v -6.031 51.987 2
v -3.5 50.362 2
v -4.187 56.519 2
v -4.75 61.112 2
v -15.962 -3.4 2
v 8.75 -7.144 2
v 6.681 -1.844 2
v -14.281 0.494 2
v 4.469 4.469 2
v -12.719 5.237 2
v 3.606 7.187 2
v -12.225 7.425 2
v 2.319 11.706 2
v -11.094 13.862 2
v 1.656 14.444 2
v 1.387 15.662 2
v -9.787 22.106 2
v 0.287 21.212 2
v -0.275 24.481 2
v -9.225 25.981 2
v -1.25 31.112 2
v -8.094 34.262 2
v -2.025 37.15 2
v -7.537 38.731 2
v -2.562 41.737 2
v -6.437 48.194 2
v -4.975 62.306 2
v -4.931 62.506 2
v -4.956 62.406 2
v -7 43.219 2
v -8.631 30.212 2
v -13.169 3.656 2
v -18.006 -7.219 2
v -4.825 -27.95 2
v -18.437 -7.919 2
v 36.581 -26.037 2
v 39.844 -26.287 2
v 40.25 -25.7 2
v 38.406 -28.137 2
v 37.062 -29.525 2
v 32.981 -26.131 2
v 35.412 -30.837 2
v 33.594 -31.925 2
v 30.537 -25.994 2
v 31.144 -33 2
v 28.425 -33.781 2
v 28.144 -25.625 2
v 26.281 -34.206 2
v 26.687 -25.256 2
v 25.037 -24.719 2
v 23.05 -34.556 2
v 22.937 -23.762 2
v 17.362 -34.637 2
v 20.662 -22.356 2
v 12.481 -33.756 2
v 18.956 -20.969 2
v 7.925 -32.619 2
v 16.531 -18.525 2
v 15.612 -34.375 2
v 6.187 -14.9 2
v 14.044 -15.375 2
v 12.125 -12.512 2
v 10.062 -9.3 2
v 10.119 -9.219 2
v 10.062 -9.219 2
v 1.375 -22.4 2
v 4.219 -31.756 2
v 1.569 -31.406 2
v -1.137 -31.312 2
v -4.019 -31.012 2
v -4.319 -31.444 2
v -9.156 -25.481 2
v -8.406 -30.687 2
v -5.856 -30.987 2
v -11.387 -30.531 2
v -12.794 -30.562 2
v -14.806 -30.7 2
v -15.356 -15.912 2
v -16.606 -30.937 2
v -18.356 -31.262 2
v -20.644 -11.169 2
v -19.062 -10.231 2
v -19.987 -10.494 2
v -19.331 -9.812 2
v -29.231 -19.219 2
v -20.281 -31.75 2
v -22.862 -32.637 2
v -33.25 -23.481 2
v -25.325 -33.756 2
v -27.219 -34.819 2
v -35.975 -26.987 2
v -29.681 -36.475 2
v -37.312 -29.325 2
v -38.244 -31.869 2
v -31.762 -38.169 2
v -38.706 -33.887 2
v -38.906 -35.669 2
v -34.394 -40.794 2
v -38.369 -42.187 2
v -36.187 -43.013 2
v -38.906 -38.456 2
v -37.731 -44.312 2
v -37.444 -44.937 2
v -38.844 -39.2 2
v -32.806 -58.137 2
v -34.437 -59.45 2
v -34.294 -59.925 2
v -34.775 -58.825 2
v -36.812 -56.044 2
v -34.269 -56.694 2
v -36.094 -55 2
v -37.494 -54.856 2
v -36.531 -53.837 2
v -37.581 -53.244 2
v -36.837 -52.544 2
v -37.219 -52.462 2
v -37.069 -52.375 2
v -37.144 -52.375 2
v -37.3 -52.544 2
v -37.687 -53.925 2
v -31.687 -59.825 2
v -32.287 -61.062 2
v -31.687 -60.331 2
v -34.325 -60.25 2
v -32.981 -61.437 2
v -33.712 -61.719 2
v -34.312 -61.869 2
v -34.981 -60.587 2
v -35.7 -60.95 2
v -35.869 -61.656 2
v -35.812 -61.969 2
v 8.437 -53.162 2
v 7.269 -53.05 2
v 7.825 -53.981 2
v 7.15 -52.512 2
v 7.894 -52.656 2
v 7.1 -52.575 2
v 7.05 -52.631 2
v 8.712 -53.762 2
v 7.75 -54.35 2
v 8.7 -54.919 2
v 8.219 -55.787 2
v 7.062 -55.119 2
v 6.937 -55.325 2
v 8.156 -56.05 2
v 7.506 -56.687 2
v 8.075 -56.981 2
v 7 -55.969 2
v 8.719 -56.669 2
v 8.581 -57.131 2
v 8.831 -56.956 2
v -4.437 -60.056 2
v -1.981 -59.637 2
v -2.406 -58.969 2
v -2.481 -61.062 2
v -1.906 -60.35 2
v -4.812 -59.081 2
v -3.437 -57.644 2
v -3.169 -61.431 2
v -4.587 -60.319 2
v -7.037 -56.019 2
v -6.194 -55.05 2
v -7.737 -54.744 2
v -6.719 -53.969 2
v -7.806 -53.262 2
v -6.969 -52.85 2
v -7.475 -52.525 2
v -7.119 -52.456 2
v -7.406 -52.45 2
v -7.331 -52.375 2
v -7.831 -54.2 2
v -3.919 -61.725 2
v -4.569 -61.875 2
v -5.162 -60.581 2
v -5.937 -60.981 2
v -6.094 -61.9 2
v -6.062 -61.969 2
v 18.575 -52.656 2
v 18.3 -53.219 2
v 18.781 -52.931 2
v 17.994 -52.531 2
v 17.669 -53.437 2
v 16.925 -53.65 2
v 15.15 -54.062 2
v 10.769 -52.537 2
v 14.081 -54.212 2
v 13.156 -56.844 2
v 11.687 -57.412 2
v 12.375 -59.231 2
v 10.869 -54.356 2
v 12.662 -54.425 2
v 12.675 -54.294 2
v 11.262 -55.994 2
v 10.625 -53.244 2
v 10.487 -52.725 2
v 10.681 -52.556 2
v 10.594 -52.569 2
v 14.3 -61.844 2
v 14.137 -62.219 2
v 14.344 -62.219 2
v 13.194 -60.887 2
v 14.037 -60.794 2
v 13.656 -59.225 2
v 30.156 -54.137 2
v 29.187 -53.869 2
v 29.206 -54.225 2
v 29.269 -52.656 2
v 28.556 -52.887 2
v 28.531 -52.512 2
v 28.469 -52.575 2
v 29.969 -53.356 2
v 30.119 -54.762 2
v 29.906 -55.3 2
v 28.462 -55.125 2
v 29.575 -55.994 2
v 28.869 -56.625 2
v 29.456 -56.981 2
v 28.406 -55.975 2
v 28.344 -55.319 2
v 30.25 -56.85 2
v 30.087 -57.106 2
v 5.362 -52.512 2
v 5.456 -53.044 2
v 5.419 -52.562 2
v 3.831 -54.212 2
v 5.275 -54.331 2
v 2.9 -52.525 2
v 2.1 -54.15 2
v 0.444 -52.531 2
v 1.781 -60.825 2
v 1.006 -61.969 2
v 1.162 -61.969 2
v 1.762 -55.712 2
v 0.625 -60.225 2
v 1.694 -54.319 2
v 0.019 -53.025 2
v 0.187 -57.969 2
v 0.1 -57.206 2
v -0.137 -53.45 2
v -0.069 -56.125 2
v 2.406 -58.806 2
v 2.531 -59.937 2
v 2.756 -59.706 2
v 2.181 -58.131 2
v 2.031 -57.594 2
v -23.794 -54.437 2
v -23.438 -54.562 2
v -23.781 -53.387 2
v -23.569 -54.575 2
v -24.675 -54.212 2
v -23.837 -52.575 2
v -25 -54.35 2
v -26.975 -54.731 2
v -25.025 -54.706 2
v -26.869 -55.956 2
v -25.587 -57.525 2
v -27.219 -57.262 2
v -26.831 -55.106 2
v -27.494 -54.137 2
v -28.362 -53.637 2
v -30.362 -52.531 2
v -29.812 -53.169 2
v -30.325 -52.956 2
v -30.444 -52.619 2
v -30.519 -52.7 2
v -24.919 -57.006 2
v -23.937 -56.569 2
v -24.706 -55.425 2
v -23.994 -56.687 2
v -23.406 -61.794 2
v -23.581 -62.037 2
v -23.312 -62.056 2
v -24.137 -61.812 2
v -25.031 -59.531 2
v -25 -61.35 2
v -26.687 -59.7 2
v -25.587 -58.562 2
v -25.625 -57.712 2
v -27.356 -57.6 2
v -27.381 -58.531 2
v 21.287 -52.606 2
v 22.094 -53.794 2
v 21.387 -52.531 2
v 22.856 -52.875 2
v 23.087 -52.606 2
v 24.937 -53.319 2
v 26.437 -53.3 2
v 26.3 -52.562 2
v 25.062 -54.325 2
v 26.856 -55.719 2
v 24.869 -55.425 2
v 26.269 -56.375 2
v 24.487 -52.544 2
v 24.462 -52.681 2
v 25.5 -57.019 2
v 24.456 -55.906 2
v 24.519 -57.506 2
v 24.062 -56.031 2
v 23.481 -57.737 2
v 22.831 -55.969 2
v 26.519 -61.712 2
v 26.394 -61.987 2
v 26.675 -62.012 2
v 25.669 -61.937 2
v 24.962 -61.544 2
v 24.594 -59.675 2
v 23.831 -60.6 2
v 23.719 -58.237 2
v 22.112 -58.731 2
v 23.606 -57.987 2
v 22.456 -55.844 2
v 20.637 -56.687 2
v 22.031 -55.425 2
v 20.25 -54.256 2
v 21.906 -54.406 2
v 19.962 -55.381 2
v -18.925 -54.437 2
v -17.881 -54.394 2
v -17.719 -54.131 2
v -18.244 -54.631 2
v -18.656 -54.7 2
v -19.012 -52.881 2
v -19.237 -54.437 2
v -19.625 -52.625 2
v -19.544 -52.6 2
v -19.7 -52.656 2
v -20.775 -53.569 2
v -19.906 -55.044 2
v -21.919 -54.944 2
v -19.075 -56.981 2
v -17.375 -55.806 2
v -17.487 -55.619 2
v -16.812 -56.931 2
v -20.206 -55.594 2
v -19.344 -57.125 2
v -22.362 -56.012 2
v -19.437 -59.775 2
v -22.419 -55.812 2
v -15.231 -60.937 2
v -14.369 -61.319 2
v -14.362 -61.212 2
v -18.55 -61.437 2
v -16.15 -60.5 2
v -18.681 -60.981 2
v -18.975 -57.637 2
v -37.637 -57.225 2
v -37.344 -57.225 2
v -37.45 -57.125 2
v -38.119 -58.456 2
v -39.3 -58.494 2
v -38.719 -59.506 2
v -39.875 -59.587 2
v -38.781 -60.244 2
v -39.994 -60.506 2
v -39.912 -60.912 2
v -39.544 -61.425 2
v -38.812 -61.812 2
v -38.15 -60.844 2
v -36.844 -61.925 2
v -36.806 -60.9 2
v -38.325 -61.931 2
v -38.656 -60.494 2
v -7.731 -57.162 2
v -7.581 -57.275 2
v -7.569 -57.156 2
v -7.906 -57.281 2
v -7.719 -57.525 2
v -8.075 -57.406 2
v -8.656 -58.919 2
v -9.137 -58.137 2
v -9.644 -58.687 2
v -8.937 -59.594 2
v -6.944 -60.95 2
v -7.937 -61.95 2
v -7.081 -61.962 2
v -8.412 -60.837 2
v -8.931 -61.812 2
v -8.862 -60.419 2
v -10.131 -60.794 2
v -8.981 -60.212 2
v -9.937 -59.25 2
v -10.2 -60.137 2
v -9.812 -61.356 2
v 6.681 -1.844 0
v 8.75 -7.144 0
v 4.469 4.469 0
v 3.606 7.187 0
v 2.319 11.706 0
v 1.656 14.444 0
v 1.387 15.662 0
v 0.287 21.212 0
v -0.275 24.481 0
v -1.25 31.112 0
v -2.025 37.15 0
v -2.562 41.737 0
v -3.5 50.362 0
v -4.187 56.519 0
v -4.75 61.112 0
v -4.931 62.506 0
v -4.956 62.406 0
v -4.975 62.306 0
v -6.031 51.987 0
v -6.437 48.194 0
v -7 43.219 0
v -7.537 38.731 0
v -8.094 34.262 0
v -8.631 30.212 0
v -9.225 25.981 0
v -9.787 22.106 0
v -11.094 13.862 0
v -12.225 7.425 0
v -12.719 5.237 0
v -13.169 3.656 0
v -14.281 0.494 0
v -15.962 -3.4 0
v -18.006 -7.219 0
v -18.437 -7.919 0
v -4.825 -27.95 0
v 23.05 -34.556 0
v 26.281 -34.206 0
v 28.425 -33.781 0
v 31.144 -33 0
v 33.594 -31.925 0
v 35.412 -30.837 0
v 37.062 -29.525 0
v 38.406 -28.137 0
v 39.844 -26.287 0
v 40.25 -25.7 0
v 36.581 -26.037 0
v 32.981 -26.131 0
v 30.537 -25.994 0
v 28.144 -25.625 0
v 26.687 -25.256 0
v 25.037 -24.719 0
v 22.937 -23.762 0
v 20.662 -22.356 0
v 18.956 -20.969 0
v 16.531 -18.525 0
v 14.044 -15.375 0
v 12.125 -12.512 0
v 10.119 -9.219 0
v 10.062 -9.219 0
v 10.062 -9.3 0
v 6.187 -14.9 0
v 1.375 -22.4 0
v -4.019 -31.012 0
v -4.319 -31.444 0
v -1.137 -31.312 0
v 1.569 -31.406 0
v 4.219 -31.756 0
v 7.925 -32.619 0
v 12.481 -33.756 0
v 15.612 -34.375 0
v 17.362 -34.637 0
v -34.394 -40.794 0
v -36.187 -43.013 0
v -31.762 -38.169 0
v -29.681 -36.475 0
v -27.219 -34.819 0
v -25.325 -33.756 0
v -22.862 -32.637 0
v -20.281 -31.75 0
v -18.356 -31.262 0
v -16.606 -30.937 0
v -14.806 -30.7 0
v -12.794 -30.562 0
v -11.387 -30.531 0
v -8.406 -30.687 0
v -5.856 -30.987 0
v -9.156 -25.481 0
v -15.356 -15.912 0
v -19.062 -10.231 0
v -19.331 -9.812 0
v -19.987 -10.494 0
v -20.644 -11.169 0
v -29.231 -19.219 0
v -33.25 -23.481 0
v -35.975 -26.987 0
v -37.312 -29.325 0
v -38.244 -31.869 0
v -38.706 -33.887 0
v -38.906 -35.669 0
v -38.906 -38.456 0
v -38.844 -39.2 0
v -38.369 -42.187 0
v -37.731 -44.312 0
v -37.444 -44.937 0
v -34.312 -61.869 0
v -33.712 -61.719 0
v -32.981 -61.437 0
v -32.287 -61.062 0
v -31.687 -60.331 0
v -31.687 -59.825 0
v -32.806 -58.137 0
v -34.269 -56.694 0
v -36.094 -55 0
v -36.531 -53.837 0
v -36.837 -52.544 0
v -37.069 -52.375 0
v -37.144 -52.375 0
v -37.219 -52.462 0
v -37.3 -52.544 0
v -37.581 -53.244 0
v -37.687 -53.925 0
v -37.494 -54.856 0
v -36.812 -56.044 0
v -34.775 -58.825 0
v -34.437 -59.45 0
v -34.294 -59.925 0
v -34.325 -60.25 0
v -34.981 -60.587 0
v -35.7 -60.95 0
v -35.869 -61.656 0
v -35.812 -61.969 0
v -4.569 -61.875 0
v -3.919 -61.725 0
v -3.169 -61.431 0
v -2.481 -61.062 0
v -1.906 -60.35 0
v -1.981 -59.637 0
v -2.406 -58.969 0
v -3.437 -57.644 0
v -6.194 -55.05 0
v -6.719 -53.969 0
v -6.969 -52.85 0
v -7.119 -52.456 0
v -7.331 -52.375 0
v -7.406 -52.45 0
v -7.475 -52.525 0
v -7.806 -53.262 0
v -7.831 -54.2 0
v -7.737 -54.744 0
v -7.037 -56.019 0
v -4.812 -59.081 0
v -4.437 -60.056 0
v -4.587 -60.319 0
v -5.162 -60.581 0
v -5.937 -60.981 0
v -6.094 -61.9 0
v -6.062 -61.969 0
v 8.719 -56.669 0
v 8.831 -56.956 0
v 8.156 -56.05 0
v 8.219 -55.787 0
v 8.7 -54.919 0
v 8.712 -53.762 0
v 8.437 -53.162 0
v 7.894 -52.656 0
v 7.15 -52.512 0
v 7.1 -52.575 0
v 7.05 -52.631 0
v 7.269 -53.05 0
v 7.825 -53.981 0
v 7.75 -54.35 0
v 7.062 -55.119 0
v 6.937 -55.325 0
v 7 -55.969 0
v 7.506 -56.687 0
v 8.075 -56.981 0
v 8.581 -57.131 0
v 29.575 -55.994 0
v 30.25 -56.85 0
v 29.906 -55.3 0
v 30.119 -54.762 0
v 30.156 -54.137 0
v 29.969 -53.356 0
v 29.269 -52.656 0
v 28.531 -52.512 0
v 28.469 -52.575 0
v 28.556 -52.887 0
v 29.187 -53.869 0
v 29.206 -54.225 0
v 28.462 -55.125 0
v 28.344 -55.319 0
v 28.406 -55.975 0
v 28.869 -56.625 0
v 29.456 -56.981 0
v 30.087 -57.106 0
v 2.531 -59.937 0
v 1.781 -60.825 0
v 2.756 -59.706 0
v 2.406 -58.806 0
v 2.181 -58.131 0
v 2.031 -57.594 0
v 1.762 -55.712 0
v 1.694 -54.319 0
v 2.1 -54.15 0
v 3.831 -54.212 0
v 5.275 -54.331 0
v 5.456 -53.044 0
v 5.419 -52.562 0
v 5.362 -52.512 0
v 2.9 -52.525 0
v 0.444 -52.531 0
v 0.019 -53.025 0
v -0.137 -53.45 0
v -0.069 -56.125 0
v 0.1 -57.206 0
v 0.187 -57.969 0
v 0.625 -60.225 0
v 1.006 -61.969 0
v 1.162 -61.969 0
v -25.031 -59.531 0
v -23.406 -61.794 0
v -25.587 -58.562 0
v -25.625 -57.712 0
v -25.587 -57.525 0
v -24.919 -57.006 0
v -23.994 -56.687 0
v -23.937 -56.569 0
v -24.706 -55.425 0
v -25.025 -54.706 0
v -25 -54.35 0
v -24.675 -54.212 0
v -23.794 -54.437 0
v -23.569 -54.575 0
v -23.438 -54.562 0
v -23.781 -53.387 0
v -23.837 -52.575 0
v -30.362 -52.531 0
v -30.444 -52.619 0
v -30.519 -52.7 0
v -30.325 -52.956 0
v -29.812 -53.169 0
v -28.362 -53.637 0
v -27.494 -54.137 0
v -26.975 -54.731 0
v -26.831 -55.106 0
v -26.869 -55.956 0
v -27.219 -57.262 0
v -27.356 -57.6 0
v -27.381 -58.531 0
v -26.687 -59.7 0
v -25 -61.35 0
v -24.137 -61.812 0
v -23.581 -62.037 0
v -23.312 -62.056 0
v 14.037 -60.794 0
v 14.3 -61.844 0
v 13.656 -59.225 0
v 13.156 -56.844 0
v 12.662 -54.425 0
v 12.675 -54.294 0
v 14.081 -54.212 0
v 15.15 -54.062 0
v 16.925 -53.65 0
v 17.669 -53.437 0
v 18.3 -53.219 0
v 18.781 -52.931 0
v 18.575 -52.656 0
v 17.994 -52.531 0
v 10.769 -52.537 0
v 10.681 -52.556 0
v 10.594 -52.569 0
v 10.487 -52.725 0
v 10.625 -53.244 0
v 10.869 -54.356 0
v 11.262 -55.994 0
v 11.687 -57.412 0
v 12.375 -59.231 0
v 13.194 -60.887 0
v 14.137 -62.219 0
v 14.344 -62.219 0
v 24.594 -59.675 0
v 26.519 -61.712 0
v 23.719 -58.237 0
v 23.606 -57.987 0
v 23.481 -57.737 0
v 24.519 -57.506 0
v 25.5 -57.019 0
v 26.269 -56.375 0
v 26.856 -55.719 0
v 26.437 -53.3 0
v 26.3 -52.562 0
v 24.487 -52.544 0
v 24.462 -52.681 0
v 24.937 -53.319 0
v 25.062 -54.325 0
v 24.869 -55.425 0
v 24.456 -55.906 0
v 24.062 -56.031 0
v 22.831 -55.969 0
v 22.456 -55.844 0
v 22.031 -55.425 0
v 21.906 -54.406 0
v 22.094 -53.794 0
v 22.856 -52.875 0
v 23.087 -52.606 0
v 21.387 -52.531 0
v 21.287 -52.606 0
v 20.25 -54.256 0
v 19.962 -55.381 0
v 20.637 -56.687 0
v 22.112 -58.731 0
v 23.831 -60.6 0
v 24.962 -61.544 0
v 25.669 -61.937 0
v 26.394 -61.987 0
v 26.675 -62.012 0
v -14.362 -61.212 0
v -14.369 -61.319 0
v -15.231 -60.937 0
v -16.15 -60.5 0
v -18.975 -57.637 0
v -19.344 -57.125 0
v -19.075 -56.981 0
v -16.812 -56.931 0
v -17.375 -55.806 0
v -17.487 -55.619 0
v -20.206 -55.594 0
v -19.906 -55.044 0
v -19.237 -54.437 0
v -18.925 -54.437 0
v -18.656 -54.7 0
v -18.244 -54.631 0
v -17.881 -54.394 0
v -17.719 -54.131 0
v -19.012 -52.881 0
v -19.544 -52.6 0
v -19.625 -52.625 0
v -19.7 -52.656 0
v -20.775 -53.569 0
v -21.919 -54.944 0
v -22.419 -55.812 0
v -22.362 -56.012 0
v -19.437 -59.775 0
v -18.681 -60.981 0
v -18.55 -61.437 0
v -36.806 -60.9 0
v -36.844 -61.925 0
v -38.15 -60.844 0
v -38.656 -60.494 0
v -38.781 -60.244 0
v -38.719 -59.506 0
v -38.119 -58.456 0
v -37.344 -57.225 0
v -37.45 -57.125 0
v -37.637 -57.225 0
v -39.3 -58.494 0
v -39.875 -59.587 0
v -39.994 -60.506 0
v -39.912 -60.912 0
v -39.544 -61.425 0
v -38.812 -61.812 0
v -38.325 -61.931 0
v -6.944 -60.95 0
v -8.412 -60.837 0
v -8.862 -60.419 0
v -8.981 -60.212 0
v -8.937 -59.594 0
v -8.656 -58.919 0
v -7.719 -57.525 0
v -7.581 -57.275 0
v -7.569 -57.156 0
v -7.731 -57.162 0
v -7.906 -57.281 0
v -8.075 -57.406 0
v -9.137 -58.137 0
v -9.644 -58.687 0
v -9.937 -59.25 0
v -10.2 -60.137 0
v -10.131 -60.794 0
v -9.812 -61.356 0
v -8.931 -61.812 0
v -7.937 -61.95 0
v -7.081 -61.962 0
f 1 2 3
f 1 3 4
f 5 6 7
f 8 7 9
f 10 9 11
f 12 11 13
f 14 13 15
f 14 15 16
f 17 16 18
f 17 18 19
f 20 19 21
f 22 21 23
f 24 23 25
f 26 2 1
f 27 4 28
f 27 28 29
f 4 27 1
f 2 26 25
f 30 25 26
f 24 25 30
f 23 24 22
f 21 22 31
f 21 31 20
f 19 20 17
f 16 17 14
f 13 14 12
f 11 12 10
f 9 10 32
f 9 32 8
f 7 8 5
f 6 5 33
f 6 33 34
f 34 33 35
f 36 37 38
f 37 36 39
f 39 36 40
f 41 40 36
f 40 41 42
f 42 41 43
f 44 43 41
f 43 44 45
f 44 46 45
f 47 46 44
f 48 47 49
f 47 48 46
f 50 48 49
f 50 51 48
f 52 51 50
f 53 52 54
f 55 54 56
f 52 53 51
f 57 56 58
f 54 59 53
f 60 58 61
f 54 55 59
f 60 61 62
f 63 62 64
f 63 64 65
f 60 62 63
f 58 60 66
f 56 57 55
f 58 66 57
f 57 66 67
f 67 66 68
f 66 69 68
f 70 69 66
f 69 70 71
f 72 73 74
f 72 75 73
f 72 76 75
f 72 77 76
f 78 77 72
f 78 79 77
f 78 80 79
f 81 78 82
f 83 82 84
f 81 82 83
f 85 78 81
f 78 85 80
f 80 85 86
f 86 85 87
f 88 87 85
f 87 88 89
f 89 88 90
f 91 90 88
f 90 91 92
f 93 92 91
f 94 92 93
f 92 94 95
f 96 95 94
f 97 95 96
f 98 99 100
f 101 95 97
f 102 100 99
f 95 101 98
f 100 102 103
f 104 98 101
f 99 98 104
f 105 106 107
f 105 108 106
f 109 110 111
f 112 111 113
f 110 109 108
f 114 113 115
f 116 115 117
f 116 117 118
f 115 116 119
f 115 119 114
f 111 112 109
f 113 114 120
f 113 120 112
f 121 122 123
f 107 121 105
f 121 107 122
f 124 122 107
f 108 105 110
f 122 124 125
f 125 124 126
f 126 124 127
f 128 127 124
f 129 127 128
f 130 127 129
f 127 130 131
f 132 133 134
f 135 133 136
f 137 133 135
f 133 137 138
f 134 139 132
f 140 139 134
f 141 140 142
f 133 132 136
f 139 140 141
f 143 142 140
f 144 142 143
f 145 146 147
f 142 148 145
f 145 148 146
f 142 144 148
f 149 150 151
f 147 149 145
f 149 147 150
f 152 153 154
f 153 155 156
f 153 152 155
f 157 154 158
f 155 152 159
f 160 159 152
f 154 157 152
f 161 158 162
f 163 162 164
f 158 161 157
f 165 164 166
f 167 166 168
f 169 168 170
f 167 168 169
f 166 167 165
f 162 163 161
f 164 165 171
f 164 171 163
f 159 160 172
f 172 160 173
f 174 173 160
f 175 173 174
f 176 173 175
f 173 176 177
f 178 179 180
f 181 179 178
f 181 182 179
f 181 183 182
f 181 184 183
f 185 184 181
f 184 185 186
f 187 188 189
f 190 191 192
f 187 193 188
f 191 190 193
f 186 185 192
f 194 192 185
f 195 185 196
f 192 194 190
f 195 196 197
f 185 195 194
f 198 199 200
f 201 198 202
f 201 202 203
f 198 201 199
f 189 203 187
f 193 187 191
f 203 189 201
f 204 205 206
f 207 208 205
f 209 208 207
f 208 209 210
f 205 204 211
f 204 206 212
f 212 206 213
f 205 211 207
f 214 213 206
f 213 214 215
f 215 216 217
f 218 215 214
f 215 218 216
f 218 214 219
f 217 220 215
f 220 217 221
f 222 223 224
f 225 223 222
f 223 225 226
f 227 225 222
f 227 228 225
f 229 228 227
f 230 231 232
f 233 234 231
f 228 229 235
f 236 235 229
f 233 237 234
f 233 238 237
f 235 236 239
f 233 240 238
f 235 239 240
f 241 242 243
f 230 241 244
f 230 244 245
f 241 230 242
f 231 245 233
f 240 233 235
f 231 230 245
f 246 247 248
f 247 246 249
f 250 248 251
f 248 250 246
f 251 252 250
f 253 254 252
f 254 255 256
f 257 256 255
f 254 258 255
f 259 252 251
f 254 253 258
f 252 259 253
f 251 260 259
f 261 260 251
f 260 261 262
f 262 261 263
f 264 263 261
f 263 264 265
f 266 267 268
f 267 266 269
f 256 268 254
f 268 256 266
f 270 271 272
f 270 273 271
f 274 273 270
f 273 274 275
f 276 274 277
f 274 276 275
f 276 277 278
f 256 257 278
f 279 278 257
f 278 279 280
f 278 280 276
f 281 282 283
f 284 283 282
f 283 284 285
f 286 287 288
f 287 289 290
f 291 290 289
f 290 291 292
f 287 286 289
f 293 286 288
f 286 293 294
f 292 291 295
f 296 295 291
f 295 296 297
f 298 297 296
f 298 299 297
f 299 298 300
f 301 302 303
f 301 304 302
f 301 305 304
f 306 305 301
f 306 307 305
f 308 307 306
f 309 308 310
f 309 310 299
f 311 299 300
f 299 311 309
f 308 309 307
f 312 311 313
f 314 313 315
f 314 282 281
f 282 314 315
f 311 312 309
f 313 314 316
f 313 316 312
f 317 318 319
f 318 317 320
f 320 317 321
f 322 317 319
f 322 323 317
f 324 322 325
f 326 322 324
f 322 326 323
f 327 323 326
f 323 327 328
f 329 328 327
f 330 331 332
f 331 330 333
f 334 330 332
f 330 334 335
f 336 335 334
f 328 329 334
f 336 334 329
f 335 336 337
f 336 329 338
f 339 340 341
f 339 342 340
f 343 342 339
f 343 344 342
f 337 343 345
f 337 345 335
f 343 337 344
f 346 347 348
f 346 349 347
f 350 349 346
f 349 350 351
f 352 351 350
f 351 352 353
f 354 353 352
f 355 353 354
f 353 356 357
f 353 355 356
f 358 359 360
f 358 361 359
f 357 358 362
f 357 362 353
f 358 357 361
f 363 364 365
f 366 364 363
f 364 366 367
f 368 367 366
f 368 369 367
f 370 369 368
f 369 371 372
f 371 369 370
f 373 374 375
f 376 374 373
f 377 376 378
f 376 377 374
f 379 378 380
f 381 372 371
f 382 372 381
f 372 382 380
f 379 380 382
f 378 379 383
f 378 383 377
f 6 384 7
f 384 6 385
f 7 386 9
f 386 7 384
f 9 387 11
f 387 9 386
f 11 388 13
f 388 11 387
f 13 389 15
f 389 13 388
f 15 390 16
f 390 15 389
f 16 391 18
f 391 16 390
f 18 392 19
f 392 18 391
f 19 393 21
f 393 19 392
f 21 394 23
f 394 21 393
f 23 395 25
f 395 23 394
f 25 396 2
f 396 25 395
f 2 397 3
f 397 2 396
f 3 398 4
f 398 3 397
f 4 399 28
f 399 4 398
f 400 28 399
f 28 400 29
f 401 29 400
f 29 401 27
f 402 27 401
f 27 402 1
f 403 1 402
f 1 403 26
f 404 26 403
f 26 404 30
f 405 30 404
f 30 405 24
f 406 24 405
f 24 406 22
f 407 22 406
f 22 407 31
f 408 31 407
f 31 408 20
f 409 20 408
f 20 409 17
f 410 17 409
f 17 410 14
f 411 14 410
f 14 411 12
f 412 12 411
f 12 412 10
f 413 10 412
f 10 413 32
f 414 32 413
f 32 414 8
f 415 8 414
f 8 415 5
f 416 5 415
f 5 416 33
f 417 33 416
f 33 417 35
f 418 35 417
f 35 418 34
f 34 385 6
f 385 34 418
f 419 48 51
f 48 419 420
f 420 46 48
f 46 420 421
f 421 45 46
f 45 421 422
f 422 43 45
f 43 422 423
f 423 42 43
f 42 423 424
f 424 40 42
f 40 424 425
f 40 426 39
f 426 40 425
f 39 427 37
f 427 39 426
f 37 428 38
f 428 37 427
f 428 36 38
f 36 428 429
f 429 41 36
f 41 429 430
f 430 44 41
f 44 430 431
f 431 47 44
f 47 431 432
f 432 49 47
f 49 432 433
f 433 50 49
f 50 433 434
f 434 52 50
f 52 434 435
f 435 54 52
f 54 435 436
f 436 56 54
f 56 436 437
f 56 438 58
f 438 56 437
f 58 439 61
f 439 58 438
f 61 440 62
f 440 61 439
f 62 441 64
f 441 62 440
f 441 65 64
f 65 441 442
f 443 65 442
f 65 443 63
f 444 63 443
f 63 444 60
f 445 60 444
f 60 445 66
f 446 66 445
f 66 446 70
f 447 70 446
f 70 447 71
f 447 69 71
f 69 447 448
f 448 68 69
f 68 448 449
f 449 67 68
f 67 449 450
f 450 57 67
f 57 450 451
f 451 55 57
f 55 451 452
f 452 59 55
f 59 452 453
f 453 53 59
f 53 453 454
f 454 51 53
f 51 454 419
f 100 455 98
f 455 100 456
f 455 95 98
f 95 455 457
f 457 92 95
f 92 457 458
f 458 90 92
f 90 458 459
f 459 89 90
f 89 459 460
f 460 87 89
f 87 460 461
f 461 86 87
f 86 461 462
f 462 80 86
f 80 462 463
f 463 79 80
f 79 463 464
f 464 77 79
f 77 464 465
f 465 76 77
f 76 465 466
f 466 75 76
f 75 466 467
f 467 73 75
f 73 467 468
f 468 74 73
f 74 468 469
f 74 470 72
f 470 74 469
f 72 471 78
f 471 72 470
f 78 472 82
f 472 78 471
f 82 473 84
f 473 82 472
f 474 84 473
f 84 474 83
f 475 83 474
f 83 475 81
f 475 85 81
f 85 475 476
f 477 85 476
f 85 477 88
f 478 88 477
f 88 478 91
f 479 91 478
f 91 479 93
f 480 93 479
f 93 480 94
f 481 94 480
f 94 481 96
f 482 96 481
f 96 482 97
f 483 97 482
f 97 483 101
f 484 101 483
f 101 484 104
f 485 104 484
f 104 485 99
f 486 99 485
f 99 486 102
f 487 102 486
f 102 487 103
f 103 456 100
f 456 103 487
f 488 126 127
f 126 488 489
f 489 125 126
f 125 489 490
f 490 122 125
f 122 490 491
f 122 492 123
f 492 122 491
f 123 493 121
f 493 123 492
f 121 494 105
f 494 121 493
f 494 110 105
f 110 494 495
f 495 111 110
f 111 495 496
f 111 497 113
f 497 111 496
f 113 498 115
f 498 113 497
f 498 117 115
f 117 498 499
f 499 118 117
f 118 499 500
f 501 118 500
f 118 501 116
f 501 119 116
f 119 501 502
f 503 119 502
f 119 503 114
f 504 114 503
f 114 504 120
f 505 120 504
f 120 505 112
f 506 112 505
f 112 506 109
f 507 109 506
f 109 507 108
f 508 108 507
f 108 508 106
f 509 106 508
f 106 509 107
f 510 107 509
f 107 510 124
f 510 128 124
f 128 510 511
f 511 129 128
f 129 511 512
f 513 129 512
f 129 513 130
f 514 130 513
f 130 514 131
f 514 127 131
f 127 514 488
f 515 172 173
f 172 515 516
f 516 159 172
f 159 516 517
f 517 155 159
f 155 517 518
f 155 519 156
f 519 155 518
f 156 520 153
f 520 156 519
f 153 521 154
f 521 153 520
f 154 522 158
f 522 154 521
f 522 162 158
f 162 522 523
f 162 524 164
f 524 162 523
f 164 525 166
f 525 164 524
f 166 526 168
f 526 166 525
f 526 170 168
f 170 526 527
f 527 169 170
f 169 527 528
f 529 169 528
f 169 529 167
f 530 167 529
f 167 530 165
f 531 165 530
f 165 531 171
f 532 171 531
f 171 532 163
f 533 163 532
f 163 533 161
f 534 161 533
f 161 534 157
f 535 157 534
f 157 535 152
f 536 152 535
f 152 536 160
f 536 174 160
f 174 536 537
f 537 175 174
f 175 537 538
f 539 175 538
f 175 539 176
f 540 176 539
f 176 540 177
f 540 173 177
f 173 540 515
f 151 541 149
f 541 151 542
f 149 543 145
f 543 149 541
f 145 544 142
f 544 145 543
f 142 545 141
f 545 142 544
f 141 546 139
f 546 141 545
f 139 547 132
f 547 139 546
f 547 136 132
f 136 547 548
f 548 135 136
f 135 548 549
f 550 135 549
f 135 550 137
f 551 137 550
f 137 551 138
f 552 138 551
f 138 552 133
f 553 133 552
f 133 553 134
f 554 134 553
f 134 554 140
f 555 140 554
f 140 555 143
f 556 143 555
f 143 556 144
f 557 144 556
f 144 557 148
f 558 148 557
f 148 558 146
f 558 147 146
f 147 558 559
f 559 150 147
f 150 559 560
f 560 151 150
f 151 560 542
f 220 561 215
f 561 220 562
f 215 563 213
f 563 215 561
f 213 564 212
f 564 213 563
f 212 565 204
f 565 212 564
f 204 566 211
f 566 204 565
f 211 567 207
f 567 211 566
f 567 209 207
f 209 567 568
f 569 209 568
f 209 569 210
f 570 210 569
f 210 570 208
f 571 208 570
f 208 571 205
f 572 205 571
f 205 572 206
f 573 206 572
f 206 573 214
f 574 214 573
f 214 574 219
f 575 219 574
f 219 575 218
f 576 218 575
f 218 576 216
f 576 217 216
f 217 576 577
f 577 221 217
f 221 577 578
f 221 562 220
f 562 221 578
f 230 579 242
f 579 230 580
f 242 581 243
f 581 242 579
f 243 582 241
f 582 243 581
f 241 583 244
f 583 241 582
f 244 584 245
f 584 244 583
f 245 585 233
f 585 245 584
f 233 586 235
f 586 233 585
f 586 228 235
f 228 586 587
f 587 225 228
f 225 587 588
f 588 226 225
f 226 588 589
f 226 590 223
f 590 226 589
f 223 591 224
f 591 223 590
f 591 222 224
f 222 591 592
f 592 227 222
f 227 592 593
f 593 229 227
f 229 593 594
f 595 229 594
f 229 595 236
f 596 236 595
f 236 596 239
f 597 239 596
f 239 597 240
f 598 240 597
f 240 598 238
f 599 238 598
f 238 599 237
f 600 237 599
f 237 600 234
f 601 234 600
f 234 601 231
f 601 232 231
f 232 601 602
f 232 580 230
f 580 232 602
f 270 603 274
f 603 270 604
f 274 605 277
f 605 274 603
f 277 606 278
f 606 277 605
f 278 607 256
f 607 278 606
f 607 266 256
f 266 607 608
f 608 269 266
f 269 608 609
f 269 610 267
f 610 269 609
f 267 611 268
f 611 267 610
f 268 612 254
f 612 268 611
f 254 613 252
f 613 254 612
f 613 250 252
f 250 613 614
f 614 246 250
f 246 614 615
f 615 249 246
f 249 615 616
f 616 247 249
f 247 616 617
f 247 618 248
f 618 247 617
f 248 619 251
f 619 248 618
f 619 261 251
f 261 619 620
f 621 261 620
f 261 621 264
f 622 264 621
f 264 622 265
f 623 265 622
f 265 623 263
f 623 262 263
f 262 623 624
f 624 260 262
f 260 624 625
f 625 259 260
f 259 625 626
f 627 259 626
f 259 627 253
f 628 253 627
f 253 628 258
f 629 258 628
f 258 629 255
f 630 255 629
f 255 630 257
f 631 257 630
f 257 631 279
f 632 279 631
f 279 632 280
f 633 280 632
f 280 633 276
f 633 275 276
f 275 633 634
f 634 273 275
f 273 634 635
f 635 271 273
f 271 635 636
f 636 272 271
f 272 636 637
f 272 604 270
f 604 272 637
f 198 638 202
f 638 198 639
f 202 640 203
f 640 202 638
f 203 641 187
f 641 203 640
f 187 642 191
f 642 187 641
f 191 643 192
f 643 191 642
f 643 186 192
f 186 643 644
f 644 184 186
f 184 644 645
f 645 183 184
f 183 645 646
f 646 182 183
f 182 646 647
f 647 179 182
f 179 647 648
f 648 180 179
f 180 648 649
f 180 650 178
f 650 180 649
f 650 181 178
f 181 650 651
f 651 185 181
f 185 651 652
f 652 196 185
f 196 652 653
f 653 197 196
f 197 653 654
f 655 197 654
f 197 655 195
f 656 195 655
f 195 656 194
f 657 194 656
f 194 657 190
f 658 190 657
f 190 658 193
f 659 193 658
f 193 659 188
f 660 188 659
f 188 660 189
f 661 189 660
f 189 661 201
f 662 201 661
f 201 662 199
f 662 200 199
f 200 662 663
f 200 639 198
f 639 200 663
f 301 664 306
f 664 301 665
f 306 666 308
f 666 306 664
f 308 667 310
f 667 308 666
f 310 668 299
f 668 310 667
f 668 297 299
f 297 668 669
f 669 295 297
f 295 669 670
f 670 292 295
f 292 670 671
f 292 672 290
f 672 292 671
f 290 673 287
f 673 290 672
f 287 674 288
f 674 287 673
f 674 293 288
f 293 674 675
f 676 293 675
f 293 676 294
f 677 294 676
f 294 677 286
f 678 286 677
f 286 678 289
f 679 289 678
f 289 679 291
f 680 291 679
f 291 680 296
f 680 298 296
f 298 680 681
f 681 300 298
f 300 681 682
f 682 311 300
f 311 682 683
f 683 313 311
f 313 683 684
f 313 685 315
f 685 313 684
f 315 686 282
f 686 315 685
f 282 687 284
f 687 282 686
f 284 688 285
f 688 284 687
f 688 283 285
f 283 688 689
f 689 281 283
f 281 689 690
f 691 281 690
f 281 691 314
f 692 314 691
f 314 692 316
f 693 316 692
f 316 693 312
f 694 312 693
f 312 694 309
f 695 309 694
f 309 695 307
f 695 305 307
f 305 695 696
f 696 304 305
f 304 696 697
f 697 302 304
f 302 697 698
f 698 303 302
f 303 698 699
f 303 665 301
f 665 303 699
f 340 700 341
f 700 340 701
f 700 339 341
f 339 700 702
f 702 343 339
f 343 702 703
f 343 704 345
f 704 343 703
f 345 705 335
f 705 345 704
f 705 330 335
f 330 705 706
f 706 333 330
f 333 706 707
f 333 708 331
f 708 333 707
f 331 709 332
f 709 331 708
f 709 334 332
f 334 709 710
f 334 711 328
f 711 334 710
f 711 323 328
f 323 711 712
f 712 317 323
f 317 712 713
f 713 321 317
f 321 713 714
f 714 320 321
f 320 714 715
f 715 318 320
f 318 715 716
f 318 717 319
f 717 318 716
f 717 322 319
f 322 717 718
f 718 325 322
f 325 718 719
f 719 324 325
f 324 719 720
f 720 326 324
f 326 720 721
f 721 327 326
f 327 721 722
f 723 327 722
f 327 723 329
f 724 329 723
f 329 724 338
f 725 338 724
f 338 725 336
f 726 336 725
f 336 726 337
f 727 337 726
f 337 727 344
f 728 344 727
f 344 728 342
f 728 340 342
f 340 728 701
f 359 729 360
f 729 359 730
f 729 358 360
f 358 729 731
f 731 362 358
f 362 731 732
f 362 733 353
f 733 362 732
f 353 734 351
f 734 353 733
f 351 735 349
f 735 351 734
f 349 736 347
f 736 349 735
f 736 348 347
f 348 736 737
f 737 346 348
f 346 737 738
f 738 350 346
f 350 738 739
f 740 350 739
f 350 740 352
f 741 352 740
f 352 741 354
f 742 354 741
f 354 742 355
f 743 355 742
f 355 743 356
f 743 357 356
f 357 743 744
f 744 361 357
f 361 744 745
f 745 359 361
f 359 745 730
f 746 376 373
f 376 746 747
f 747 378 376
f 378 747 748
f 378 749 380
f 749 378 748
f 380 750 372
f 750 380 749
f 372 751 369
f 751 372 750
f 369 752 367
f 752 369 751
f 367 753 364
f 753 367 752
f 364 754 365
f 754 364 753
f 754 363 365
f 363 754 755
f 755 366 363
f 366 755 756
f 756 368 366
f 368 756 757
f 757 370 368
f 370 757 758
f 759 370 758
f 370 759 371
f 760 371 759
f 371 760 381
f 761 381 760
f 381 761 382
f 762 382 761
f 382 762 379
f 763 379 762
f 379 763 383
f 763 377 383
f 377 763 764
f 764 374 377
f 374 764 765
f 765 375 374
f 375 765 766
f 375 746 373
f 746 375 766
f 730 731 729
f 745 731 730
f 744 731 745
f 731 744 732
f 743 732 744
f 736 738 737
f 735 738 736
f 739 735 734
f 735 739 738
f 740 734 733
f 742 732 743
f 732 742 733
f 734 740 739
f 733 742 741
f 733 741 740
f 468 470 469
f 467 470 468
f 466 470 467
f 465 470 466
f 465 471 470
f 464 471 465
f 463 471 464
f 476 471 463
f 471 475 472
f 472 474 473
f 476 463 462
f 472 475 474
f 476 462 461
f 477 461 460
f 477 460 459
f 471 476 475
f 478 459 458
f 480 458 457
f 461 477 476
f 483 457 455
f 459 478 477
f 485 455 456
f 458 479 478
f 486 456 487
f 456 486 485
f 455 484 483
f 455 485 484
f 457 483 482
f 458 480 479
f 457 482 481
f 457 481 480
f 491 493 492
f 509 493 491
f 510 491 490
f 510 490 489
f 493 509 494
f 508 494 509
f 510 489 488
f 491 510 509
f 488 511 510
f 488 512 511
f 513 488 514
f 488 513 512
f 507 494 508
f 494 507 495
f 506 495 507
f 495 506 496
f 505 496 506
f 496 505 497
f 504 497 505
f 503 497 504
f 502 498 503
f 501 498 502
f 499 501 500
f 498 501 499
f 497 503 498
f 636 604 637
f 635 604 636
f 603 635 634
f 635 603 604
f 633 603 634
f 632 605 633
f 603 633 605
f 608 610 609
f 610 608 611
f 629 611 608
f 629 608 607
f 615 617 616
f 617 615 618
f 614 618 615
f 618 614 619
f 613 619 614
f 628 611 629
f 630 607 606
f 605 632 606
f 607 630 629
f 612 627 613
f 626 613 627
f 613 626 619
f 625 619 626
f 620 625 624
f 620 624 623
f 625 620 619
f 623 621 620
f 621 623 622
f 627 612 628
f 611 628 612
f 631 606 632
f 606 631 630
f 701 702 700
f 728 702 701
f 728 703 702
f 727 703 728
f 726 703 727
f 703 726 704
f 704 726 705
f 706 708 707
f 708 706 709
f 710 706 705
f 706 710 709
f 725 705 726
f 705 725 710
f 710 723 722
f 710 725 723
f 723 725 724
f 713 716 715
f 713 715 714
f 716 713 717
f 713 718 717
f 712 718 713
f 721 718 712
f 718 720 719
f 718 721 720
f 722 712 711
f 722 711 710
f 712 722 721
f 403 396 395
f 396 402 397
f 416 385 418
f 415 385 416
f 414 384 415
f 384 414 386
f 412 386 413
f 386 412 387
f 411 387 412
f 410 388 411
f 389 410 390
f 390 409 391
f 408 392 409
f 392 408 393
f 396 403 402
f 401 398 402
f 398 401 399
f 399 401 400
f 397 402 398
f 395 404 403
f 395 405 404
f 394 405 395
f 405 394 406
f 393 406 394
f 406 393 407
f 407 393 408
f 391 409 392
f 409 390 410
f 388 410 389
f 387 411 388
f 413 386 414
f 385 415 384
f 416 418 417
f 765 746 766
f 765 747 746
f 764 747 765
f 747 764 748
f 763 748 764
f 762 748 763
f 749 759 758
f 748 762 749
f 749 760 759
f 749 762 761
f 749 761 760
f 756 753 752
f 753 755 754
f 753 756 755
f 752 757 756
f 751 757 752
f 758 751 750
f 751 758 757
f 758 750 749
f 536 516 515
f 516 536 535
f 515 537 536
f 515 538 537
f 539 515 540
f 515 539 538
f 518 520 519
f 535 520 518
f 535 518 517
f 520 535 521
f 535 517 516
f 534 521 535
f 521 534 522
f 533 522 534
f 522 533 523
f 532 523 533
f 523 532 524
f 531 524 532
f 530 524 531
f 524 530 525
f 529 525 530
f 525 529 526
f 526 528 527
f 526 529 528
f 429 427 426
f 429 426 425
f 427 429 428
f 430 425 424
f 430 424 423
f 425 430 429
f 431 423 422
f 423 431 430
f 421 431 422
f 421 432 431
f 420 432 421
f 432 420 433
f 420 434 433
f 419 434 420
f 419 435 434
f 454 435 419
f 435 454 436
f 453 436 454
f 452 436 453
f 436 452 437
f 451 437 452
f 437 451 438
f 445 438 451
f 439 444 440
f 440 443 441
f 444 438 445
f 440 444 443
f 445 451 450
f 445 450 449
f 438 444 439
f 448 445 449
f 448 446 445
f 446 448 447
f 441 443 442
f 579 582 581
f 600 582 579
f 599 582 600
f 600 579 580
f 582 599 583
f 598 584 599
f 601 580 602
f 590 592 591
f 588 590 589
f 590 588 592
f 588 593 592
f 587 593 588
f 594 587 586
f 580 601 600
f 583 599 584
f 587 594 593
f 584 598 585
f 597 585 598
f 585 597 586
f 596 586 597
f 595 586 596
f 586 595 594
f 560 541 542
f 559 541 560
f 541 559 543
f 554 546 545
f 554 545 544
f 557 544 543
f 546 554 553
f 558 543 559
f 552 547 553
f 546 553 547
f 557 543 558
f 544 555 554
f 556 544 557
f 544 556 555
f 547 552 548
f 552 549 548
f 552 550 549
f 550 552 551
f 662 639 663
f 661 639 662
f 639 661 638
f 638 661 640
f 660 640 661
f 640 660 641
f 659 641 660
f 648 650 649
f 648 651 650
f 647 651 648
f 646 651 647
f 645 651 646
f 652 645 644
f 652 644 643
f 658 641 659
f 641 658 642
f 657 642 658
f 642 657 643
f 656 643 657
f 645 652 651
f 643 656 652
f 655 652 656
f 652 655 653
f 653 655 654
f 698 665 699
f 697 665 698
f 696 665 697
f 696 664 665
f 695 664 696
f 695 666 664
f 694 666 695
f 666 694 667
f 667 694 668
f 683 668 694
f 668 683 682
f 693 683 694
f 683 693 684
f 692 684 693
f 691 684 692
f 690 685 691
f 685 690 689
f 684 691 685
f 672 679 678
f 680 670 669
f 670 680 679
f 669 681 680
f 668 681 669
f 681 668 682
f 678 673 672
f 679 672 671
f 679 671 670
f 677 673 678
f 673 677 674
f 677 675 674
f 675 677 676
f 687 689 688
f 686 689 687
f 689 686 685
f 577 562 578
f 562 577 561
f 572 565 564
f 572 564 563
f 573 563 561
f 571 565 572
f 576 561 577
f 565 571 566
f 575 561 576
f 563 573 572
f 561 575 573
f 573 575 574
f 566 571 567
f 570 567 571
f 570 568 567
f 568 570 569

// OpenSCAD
module dd4430c10753c260a976d4cacece056a_1()
{
 /* Generated by trace2scad version 20150415
    http://aggregate.org/MAKE/TRACE2SCAD/
    Optimized model has 387/4796 original points
 */
 color([0.48, 0.48, 0.48])
 assign(minx=0) /* polygon minx=39 */
 assign(miny=0) /* polygon miny=45 */
 assign(maxx=12880) /* polygon maxx=12880 */
 assign(maxy=20000) /* polygon maxy=20001 */
 assign(dx=maxx-minx)
 assign(dy=maxy-miny)
 assign(maxd=((dx>dy)?dx:dy))
 scale([1/maxd, 1/maxd, 1])
 translate([-minx-dx/2, -miny-dy/2, 0])
 linear_extrude(height=1, convexity=387)
 union() {
  union() {
   polygon([[5647,19985],[5644,19969],[5475,18318],[5410,17711],[5320,16915],[5234,16197],[5145,15482],[5059,14834],[4964,14157],[4874,13537],[4665,12218],[4484,11188],[4405,10838],[4333,10585],[4155,10079],[3886,9456],[3559,8845],[3490,8733],[5668,5528],[7840,8857],[7509,9705],[7155,10715],[7017,11150],[6811,11873],[6705,12311],[6662,12506],[6486,13394],[6396,13917],[6240,14978],[6116,15944],[6030,16678],[5880,18058],[5770,19043],[5680,19778],[5651,20001]], convexity=6);
   polygon([[8050,8518],[8050,8512],[7430,7616],[6660,6416],[5797,5038],[5749,4969],[6258,4990],[6691,4975],[7115,4919],[7708,4781],[8437,4599],[8938,4500],[9218,4458],[10128,4471],[10645,4527],[10988,4595],[11423,4720],[11815,4892],[12106,5066],[12370,5276],[12585,5498],[12815,5794],[12880,5888],[12293,5834],[11717,5819],[11326,5841],[10943,5900],[10710,5959],[10446,6045],[10110,6198],[9746,6423],[9473,6645],[9085,7036],[8687,7540],[8380,7998],[8059,8525],[8050,8525]], convexity=9);
   polygon([[3242,8321],[3137,8213],[1763,6925],[1120,6243],[684,5682],[470,5308],[321,4901],[247,4578],[215,4293],[215,3847],[225,3728],[301,3250],[403,2910],[449,2810],[650,3118],[937,3473],[1358,3893],[1691,4164],[2085,4429],[2388,4599],[2782,4778],[3195,4920],[3503,4998],[3783,5050],[4071,5088],[4393,5110],[4618,5115],[5095,5090],[5503,5042],[4975,5923],[3983,7454],[3390,8363],[3347,8430]], convexity=7);
   polygon([[485,1606],[472,1593],[427,1481],[410,1372],[441,1223],[550,1033],[876,588],[930,488],[953,412],[948,360],[843,306],[728,248],[701,135],[710,85],[950,101],[1046,125],[1163,170],[1274,230],[1370,347],[1370,428],[1191,698],[957,929],[665,1200],[595,1386],[546,1593],[509,1620],[497,1620]], convexity=8);
   polygon([[5255,1608],[5244,1596],[5191,1478],[5187,1328],[5202,1241],[5314,1037],[5670,547],[5730,391],[5706,349],[5614,307],[5490,243],[5465,96],[5470,85],[5709,100],[5813,124],[5933,171],[6043,230],[6135,344],[6123,458],[6055,565],[5890,777],[5449,1192],[5365,1365],[5325,1544],[5301,1607],[5267,1620]], convexity=8);
   polygon([[6904,1596],[6511,1595],[6443,1516],[6418,1448],[6429,1020],[6456,847],[6470,725],[6540,364],[6601,85],[6626,85],[6725,268],[6845,410],[6881,447],[6825,591],[6789,699],[6765,785],[6722,1086],[6711,1309],[6776,1336],[7053,1326],[7284,1307],[7313,1513],[7307,1590],[7298,1598]], convexity=10);
   polygon([[7576,1588],[7568,1579],[7603,1512],[7692,1363],[7680,1304],[7570,1181],[7550,1148],[7560,1045],[7641,930],[7732,883],[7813,859],[7853,887],[7835,933],[7745,1032],[7755,1074],[7832,1213],[7834,1398],[7790,1494],[7703,1575],[7584,1598]], convexity=10);
   polygon([[11000,1593],[10995,1588],[11009,1538],[11110,1381],[11113,1324],[10994,1180],[10975,1149],[10985,1044],[11059,940],[11153,883],[11254,863],[11280,904],[11172,1041],[11225,1152],[11259,1238],[11265,1338],[11235,1463],[11123,1575],[11005,1598]], convexity=10);
   polygon([[1569,1581],[1557,1568],[1588,1527],[1670,1493],[1902,1418],[2041,1338],[2124,1243],[2147,1183],[2141,1047],[2085,838],[2063,784],[2059,635],[2170,448],[2440,184],[2578,110],[2667,74],[2710,71],[2695,113],[2435,475],[2346,630],[2340,766],[2346,796],[2453,879],[2601,930],[2610,949],[2487,1132],[2436,1247],[2440,1304],[2492,1326],[2633,1290],[2669,1268],[2690,1270],[2635,1458],[2626,1588],[1582,1595]], convexity=13);
   polygon([[8149,1591],[8135,1589],[8118,1564],[8140,1481],[8179,1303],[8242,1041],[8310,814],[8420,523],[8551,258],[8702,45],[8735,45],[8728,105],[8686,273],[8625,524],[8545,905],[8466,1292],[8468,1313],[8693,1326],[8864,1350],[9148,1416],[9267,1450],[9368,1485],[9445,1531],[9412,1575],[9319,1595],[8163,1594]], convexity=9);
   polygon([[9854,1589],[9846,1583],[9680,1319],[9634,1139],[9742,930],[9978,603],[10253,304],[10434,153],[10547,90],[10663,82],[10708,78],[10683,126],[10375,452],[10235,682],[10217,722],[10197,762],[10363,799],[10520,877],[10643,980],[10737,1085],[10670,1472],[10648,1590],[10358,1593],[10354,1571],[10430,1469],[10450,1308],[10419,1132],[10353,1055],[10290,1035],[10093,1045],[10033,1065],[9965,1132],[9945,1295],[9975,1393],[10097,1540],[10134,1583],[9862,1595]], convexity=13);
   polygon([[3300,1580],[3288,1575],[3116,1429],[2933,1209],[2853,1070],[2862,1038],[3330,436],[3451,243],[3472,170],[4141,189],[4142,206],[4003,250],[3856,320],[3404,778],[3345,860],[3388,883],[3750,891],[3660,1071],[3642,1101],[3207,1105],[3255,1193],[3362,1290],[3412,1290],[3455,1248],[3521,1259],[3579,1297],[3605,1339],[3398,1539],[3313,1584]], convexity=12);
   polygon([[433,852],[418,844],[152,641],[60,466],[41,319],[54,254],[113,172],[230,110],[308,91],[545,92],[551,256],[336,265],[255,321],[235,361],[245,479],[341,647],[465,844],[448,860]], convexity=8);
   polygon([[5175,835],[5148,815],[4978,698],[4897,610],[4850,520],[4808,378],[4819,273],[4870,183],[5011,110],[5170,88],[5307,86],[5329,248],[5094,266],[5022,333],[5003,366],[5010,465],[5055,573],[5205,796],[5227,836],[5229,855],[5203,854]], convexity=8);
  }
 }
}

module dd4430c10753c260a976d4cacece056a()
{
 /* all layers combined, scaled to within a 1mm cube */
 scale([1, 1, 1/1])
 difference() {
  union() {
   scale([1,1,2]) translate([0,0,-0.5]) dd4430c10753c260a976d4cacece056a_1();
  }
  translate([0,0,-2]) cube([2,2,4],center=true);
 }
}

scale([125, 125, 2]) {
	dd4430c10753c260a976d4cacece056a();
}
